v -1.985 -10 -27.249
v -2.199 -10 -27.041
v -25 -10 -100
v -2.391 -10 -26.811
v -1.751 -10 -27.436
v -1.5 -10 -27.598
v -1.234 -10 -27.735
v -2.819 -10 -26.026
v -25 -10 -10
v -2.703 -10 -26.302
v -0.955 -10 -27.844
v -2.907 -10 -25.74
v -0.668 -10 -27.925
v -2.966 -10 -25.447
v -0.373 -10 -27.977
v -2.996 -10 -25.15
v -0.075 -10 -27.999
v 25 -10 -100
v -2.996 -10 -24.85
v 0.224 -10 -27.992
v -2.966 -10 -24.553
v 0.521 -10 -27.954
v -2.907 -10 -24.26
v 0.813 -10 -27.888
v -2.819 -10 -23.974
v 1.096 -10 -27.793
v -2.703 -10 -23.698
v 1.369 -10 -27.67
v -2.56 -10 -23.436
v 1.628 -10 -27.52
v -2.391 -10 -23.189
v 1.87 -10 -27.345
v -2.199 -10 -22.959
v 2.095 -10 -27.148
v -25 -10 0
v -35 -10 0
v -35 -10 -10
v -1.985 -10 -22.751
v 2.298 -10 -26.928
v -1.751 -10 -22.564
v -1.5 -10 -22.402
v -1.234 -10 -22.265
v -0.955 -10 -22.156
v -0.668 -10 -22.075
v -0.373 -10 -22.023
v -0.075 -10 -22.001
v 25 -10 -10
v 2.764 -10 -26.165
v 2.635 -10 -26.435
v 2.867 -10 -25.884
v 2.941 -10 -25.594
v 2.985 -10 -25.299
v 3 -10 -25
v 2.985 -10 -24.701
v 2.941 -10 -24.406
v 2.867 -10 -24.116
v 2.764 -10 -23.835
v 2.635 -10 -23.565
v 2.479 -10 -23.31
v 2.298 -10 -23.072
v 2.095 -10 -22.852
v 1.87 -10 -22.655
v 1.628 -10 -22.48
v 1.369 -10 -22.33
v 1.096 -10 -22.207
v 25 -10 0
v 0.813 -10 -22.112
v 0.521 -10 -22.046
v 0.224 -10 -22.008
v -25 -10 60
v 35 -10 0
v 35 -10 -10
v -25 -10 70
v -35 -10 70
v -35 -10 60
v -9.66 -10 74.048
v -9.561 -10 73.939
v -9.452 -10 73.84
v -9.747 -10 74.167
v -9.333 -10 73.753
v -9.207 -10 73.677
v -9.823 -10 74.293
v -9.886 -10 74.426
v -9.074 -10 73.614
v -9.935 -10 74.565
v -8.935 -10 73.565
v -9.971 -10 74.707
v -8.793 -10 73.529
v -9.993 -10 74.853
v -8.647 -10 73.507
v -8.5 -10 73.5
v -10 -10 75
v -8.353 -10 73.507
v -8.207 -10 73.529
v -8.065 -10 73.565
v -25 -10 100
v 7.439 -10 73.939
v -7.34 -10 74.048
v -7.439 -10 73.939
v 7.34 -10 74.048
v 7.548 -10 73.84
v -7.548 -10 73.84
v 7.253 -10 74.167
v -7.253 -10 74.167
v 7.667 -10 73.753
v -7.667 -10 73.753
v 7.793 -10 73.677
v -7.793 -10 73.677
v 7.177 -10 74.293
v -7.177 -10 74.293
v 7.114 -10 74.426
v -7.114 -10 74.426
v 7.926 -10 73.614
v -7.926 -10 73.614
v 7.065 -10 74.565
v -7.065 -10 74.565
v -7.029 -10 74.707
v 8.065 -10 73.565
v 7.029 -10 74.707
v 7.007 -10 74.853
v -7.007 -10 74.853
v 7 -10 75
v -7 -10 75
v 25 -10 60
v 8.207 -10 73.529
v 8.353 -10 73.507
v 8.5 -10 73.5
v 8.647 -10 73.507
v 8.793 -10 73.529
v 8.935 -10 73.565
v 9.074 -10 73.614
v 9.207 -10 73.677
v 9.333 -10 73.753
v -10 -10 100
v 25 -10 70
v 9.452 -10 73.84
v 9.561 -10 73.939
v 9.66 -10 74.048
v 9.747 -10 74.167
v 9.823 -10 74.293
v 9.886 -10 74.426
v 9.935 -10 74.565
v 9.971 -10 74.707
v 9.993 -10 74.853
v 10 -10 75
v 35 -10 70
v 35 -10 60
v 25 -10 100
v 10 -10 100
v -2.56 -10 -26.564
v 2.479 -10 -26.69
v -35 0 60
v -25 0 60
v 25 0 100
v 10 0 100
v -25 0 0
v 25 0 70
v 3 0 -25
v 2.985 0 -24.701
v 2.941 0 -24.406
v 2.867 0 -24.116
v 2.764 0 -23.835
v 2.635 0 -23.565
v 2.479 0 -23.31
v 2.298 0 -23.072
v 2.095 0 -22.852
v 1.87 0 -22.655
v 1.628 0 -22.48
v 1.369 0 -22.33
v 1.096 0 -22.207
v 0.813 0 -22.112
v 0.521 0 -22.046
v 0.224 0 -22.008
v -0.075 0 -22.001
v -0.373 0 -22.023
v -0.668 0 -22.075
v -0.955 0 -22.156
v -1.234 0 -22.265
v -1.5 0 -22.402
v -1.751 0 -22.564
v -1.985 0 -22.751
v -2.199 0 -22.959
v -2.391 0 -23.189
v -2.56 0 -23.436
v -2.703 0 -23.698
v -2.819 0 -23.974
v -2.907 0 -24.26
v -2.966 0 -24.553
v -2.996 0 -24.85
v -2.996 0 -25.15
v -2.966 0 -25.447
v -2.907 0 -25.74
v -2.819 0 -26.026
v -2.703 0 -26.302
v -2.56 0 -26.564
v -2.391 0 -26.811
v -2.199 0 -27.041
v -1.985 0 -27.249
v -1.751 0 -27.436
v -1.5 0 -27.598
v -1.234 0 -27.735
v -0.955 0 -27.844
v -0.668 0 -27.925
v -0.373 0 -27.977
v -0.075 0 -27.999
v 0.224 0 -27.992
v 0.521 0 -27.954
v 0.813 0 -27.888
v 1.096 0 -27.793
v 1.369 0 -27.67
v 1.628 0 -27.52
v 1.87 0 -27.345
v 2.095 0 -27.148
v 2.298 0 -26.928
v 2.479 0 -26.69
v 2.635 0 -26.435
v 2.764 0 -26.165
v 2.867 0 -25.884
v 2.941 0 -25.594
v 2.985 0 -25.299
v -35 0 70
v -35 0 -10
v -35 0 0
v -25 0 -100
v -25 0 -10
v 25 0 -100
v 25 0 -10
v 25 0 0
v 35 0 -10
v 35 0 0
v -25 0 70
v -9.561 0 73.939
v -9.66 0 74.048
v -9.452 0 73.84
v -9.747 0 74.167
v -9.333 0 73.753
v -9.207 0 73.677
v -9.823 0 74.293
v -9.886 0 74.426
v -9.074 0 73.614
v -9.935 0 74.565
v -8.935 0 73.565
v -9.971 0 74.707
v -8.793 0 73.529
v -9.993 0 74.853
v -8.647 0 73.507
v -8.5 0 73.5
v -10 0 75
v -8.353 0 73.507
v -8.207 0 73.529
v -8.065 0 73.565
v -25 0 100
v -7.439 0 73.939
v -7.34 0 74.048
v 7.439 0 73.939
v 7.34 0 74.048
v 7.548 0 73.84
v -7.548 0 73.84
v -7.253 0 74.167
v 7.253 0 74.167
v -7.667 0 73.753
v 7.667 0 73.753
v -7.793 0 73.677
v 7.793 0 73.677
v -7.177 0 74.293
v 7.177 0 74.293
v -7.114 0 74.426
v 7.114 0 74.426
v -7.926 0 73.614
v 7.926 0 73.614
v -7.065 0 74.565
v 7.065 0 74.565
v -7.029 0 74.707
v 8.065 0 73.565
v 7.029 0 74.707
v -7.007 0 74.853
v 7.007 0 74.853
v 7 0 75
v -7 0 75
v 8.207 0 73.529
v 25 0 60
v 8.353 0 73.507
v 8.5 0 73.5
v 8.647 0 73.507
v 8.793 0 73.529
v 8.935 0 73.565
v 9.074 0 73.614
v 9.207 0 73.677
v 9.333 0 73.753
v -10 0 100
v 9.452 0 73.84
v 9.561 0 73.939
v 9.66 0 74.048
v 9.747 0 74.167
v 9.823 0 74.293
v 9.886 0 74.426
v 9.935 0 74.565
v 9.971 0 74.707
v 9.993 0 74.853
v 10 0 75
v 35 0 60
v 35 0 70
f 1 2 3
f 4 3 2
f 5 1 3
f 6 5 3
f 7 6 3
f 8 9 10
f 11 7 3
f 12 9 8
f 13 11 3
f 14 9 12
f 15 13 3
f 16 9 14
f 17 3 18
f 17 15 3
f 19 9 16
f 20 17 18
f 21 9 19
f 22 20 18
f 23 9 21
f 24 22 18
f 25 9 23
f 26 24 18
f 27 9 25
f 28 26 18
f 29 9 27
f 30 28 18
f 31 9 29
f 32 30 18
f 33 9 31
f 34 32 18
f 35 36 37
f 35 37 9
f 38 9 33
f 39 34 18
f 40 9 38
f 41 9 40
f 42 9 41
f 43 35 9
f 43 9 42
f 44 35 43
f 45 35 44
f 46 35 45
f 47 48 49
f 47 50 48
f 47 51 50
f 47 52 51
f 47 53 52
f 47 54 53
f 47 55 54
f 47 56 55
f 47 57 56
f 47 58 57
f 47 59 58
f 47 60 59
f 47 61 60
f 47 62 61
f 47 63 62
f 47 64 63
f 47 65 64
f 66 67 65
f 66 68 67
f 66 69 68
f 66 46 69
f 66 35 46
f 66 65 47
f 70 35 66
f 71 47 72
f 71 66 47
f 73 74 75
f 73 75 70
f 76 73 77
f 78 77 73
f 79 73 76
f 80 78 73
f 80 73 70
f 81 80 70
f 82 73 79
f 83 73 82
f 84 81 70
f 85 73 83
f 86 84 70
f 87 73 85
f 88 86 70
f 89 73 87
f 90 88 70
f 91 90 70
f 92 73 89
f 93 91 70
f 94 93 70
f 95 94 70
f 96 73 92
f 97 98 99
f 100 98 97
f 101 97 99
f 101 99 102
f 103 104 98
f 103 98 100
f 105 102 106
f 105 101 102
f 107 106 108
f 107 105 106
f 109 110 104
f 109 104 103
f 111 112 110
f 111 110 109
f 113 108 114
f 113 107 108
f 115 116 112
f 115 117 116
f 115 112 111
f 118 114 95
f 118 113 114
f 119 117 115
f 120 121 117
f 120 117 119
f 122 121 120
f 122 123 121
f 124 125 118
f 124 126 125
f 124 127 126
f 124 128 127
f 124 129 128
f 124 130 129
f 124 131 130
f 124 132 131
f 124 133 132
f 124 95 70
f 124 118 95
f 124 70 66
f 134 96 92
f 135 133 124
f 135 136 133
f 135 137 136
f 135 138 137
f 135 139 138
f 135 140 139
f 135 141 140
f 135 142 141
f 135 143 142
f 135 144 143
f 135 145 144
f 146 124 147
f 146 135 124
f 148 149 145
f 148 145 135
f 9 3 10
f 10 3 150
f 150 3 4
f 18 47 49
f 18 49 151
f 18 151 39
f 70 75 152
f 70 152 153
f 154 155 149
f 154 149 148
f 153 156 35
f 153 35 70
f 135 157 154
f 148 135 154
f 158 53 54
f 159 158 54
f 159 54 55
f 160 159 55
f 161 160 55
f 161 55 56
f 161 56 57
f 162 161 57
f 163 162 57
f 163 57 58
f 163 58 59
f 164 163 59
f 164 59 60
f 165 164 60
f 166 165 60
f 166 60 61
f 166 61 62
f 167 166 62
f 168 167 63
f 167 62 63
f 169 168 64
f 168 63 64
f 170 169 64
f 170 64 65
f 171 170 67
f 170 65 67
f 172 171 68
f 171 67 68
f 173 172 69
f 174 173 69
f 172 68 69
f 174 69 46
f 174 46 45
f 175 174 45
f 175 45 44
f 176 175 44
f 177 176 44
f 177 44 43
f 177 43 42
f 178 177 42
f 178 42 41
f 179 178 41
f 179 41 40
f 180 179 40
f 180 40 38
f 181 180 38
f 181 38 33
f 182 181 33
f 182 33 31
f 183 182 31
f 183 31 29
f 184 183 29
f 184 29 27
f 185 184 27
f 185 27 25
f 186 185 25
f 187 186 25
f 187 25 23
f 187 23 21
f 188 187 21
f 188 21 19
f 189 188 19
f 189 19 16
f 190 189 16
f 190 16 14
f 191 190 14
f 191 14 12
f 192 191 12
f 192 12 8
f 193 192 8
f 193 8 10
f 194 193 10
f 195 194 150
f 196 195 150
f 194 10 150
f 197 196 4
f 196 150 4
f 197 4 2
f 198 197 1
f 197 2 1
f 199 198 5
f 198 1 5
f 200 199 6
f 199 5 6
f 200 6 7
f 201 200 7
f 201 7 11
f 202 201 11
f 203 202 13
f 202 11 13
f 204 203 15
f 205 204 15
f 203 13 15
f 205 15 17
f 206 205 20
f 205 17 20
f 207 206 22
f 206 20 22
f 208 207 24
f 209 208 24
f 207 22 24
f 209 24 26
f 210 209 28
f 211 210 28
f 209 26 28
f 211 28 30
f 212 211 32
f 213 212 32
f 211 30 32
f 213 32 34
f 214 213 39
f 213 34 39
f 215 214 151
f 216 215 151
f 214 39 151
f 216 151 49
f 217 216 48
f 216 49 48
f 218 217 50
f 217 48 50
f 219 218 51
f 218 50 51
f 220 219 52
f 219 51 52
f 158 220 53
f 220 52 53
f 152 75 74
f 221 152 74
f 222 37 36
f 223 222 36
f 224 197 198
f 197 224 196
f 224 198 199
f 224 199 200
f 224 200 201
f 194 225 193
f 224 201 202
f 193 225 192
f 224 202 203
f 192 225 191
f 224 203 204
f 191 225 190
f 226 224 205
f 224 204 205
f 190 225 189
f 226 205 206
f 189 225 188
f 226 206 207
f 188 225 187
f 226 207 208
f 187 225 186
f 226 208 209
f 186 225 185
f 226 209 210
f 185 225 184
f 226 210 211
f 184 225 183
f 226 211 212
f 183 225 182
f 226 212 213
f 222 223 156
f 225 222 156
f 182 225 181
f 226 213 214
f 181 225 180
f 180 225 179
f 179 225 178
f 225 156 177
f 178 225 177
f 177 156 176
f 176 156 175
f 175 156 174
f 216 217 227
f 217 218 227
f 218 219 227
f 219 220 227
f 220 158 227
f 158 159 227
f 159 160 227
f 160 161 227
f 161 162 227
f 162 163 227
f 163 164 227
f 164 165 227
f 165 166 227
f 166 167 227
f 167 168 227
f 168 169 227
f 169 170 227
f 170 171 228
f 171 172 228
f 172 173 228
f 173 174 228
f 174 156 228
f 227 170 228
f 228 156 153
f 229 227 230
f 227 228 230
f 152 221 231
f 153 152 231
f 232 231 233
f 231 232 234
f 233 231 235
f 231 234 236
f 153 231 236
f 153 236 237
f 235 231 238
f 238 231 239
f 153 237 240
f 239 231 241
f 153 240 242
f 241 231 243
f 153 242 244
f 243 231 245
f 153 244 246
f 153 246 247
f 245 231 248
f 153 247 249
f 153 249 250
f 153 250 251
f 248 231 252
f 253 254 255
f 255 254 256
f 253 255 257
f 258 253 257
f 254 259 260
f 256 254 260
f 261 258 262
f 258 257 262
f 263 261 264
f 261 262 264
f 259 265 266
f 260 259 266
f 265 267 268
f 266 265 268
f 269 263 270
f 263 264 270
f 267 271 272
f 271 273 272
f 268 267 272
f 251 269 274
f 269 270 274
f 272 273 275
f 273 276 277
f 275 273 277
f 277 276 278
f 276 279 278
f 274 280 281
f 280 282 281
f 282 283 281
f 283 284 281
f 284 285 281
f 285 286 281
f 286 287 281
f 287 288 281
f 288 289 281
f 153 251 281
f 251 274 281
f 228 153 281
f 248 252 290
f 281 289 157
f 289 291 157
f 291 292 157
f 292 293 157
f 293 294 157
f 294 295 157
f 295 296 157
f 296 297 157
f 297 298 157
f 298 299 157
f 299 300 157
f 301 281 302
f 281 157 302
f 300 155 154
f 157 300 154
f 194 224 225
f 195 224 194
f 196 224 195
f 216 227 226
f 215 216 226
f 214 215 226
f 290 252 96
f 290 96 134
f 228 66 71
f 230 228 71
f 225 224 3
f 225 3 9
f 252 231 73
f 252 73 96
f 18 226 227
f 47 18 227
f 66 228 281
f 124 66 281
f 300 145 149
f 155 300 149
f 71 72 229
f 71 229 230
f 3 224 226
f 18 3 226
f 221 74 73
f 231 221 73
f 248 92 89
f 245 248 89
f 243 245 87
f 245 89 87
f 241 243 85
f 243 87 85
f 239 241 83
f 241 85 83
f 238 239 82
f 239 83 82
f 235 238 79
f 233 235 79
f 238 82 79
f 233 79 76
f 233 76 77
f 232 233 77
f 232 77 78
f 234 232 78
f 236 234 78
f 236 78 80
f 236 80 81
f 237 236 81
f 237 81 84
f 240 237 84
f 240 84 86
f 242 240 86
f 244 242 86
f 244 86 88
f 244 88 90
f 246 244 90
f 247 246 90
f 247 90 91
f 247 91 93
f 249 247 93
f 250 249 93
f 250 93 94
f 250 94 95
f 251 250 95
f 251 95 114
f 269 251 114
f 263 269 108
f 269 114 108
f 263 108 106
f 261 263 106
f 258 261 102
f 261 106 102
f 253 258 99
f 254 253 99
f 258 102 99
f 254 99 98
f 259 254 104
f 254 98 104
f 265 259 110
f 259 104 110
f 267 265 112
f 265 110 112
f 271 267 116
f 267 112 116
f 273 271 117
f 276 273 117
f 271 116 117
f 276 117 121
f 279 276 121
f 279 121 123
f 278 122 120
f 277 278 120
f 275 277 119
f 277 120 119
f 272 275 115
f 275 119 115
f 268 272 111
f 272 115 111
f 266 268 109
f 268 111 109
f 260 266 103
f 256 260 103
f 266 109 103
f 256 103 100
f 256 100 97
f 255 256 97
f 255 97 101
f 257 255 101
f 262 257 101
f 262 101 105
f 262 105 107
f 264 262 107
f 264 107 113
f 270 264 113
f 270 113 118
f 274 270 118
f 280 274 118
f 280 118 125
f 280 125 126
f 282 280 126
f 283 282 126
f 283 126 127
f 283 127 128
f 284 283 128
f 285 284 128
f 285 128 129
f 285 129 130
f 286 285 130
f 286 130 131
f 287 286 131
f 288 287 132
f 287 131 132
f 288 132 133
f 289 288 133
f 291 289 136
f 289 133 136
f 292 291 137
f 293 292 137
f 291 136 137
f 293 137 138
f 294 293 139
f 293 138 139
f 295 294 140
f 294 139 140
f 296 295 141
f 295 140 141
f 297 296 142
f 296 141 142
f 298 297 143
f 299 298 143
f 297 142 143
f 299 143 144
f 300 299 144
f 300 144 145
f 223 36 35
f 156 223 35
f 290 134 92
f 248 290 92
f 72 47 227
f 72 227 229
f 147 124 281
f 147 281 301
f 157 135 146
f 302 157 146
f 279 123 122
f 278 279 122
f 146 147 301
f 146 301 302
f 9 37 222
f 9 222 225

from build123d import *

# Parameters (mm, degrees)
F0_W     = 50
F0_H     = 200
F1_DEPTH = 10
F2_R     = 3
F3_DEPTH = 25
F5_DEPTH = 25
F6_W     = 10
F6_H     = 10
F7_DEPTH = 10


with BuildPart() as f1:
    # F0 (on Front) → F1 (new body)
    with BuildSketch(Plane.XZ):
        Rectangle(F0_W, F0_H)
    extrude(amount=F1_DEPTH)

    # F2 (on face) → F3 (cut)
    with BuildSketch(Plane.XZ.offset(10)):
        with Locations((0, -25)):
            Circle(F2_R)
    extrude(amount=-F3_DEPTH, mode=Mode.SUBTRACT)

    # F4 (on face) → F5 (cut)
    with BuildSketch(Plane.XZ.offset(10)):
        with BuildLine():
            Line((10, 105), (-10, 105))
            Line((-10, 105), (-10, 75))
            ThreePointArc((-10, 75), (-8.5, 73.5), (-7, 75))
            Line((-7, 75), (7, 75))
            ThreePointArc((7, 75), (8.5, 73.5), (10, 75))
            Line((10, 75), (10, 105))
        make_face()
    extrude(amount=-F5_DEPTH, mode=Mode.SUBTRACT)

    # F6 (on face) → F7 (join)
    with BuildSketch(Plane.XZ.offset(10)):
        with Locations((-30, 65)):
            Rectangle(F6_W, F6_H)
        with Locations((30, 65)):
            Rectangle(F6_W, F6_H)
        with Locations((-30, -5)):
            Rectangle(F6_W, F6_H)
        with Locations((30, -5)):
            Rectangle(F6_W, F6_H)
    extrude(amount=-F7_DEPTH)


solid = f1.part
